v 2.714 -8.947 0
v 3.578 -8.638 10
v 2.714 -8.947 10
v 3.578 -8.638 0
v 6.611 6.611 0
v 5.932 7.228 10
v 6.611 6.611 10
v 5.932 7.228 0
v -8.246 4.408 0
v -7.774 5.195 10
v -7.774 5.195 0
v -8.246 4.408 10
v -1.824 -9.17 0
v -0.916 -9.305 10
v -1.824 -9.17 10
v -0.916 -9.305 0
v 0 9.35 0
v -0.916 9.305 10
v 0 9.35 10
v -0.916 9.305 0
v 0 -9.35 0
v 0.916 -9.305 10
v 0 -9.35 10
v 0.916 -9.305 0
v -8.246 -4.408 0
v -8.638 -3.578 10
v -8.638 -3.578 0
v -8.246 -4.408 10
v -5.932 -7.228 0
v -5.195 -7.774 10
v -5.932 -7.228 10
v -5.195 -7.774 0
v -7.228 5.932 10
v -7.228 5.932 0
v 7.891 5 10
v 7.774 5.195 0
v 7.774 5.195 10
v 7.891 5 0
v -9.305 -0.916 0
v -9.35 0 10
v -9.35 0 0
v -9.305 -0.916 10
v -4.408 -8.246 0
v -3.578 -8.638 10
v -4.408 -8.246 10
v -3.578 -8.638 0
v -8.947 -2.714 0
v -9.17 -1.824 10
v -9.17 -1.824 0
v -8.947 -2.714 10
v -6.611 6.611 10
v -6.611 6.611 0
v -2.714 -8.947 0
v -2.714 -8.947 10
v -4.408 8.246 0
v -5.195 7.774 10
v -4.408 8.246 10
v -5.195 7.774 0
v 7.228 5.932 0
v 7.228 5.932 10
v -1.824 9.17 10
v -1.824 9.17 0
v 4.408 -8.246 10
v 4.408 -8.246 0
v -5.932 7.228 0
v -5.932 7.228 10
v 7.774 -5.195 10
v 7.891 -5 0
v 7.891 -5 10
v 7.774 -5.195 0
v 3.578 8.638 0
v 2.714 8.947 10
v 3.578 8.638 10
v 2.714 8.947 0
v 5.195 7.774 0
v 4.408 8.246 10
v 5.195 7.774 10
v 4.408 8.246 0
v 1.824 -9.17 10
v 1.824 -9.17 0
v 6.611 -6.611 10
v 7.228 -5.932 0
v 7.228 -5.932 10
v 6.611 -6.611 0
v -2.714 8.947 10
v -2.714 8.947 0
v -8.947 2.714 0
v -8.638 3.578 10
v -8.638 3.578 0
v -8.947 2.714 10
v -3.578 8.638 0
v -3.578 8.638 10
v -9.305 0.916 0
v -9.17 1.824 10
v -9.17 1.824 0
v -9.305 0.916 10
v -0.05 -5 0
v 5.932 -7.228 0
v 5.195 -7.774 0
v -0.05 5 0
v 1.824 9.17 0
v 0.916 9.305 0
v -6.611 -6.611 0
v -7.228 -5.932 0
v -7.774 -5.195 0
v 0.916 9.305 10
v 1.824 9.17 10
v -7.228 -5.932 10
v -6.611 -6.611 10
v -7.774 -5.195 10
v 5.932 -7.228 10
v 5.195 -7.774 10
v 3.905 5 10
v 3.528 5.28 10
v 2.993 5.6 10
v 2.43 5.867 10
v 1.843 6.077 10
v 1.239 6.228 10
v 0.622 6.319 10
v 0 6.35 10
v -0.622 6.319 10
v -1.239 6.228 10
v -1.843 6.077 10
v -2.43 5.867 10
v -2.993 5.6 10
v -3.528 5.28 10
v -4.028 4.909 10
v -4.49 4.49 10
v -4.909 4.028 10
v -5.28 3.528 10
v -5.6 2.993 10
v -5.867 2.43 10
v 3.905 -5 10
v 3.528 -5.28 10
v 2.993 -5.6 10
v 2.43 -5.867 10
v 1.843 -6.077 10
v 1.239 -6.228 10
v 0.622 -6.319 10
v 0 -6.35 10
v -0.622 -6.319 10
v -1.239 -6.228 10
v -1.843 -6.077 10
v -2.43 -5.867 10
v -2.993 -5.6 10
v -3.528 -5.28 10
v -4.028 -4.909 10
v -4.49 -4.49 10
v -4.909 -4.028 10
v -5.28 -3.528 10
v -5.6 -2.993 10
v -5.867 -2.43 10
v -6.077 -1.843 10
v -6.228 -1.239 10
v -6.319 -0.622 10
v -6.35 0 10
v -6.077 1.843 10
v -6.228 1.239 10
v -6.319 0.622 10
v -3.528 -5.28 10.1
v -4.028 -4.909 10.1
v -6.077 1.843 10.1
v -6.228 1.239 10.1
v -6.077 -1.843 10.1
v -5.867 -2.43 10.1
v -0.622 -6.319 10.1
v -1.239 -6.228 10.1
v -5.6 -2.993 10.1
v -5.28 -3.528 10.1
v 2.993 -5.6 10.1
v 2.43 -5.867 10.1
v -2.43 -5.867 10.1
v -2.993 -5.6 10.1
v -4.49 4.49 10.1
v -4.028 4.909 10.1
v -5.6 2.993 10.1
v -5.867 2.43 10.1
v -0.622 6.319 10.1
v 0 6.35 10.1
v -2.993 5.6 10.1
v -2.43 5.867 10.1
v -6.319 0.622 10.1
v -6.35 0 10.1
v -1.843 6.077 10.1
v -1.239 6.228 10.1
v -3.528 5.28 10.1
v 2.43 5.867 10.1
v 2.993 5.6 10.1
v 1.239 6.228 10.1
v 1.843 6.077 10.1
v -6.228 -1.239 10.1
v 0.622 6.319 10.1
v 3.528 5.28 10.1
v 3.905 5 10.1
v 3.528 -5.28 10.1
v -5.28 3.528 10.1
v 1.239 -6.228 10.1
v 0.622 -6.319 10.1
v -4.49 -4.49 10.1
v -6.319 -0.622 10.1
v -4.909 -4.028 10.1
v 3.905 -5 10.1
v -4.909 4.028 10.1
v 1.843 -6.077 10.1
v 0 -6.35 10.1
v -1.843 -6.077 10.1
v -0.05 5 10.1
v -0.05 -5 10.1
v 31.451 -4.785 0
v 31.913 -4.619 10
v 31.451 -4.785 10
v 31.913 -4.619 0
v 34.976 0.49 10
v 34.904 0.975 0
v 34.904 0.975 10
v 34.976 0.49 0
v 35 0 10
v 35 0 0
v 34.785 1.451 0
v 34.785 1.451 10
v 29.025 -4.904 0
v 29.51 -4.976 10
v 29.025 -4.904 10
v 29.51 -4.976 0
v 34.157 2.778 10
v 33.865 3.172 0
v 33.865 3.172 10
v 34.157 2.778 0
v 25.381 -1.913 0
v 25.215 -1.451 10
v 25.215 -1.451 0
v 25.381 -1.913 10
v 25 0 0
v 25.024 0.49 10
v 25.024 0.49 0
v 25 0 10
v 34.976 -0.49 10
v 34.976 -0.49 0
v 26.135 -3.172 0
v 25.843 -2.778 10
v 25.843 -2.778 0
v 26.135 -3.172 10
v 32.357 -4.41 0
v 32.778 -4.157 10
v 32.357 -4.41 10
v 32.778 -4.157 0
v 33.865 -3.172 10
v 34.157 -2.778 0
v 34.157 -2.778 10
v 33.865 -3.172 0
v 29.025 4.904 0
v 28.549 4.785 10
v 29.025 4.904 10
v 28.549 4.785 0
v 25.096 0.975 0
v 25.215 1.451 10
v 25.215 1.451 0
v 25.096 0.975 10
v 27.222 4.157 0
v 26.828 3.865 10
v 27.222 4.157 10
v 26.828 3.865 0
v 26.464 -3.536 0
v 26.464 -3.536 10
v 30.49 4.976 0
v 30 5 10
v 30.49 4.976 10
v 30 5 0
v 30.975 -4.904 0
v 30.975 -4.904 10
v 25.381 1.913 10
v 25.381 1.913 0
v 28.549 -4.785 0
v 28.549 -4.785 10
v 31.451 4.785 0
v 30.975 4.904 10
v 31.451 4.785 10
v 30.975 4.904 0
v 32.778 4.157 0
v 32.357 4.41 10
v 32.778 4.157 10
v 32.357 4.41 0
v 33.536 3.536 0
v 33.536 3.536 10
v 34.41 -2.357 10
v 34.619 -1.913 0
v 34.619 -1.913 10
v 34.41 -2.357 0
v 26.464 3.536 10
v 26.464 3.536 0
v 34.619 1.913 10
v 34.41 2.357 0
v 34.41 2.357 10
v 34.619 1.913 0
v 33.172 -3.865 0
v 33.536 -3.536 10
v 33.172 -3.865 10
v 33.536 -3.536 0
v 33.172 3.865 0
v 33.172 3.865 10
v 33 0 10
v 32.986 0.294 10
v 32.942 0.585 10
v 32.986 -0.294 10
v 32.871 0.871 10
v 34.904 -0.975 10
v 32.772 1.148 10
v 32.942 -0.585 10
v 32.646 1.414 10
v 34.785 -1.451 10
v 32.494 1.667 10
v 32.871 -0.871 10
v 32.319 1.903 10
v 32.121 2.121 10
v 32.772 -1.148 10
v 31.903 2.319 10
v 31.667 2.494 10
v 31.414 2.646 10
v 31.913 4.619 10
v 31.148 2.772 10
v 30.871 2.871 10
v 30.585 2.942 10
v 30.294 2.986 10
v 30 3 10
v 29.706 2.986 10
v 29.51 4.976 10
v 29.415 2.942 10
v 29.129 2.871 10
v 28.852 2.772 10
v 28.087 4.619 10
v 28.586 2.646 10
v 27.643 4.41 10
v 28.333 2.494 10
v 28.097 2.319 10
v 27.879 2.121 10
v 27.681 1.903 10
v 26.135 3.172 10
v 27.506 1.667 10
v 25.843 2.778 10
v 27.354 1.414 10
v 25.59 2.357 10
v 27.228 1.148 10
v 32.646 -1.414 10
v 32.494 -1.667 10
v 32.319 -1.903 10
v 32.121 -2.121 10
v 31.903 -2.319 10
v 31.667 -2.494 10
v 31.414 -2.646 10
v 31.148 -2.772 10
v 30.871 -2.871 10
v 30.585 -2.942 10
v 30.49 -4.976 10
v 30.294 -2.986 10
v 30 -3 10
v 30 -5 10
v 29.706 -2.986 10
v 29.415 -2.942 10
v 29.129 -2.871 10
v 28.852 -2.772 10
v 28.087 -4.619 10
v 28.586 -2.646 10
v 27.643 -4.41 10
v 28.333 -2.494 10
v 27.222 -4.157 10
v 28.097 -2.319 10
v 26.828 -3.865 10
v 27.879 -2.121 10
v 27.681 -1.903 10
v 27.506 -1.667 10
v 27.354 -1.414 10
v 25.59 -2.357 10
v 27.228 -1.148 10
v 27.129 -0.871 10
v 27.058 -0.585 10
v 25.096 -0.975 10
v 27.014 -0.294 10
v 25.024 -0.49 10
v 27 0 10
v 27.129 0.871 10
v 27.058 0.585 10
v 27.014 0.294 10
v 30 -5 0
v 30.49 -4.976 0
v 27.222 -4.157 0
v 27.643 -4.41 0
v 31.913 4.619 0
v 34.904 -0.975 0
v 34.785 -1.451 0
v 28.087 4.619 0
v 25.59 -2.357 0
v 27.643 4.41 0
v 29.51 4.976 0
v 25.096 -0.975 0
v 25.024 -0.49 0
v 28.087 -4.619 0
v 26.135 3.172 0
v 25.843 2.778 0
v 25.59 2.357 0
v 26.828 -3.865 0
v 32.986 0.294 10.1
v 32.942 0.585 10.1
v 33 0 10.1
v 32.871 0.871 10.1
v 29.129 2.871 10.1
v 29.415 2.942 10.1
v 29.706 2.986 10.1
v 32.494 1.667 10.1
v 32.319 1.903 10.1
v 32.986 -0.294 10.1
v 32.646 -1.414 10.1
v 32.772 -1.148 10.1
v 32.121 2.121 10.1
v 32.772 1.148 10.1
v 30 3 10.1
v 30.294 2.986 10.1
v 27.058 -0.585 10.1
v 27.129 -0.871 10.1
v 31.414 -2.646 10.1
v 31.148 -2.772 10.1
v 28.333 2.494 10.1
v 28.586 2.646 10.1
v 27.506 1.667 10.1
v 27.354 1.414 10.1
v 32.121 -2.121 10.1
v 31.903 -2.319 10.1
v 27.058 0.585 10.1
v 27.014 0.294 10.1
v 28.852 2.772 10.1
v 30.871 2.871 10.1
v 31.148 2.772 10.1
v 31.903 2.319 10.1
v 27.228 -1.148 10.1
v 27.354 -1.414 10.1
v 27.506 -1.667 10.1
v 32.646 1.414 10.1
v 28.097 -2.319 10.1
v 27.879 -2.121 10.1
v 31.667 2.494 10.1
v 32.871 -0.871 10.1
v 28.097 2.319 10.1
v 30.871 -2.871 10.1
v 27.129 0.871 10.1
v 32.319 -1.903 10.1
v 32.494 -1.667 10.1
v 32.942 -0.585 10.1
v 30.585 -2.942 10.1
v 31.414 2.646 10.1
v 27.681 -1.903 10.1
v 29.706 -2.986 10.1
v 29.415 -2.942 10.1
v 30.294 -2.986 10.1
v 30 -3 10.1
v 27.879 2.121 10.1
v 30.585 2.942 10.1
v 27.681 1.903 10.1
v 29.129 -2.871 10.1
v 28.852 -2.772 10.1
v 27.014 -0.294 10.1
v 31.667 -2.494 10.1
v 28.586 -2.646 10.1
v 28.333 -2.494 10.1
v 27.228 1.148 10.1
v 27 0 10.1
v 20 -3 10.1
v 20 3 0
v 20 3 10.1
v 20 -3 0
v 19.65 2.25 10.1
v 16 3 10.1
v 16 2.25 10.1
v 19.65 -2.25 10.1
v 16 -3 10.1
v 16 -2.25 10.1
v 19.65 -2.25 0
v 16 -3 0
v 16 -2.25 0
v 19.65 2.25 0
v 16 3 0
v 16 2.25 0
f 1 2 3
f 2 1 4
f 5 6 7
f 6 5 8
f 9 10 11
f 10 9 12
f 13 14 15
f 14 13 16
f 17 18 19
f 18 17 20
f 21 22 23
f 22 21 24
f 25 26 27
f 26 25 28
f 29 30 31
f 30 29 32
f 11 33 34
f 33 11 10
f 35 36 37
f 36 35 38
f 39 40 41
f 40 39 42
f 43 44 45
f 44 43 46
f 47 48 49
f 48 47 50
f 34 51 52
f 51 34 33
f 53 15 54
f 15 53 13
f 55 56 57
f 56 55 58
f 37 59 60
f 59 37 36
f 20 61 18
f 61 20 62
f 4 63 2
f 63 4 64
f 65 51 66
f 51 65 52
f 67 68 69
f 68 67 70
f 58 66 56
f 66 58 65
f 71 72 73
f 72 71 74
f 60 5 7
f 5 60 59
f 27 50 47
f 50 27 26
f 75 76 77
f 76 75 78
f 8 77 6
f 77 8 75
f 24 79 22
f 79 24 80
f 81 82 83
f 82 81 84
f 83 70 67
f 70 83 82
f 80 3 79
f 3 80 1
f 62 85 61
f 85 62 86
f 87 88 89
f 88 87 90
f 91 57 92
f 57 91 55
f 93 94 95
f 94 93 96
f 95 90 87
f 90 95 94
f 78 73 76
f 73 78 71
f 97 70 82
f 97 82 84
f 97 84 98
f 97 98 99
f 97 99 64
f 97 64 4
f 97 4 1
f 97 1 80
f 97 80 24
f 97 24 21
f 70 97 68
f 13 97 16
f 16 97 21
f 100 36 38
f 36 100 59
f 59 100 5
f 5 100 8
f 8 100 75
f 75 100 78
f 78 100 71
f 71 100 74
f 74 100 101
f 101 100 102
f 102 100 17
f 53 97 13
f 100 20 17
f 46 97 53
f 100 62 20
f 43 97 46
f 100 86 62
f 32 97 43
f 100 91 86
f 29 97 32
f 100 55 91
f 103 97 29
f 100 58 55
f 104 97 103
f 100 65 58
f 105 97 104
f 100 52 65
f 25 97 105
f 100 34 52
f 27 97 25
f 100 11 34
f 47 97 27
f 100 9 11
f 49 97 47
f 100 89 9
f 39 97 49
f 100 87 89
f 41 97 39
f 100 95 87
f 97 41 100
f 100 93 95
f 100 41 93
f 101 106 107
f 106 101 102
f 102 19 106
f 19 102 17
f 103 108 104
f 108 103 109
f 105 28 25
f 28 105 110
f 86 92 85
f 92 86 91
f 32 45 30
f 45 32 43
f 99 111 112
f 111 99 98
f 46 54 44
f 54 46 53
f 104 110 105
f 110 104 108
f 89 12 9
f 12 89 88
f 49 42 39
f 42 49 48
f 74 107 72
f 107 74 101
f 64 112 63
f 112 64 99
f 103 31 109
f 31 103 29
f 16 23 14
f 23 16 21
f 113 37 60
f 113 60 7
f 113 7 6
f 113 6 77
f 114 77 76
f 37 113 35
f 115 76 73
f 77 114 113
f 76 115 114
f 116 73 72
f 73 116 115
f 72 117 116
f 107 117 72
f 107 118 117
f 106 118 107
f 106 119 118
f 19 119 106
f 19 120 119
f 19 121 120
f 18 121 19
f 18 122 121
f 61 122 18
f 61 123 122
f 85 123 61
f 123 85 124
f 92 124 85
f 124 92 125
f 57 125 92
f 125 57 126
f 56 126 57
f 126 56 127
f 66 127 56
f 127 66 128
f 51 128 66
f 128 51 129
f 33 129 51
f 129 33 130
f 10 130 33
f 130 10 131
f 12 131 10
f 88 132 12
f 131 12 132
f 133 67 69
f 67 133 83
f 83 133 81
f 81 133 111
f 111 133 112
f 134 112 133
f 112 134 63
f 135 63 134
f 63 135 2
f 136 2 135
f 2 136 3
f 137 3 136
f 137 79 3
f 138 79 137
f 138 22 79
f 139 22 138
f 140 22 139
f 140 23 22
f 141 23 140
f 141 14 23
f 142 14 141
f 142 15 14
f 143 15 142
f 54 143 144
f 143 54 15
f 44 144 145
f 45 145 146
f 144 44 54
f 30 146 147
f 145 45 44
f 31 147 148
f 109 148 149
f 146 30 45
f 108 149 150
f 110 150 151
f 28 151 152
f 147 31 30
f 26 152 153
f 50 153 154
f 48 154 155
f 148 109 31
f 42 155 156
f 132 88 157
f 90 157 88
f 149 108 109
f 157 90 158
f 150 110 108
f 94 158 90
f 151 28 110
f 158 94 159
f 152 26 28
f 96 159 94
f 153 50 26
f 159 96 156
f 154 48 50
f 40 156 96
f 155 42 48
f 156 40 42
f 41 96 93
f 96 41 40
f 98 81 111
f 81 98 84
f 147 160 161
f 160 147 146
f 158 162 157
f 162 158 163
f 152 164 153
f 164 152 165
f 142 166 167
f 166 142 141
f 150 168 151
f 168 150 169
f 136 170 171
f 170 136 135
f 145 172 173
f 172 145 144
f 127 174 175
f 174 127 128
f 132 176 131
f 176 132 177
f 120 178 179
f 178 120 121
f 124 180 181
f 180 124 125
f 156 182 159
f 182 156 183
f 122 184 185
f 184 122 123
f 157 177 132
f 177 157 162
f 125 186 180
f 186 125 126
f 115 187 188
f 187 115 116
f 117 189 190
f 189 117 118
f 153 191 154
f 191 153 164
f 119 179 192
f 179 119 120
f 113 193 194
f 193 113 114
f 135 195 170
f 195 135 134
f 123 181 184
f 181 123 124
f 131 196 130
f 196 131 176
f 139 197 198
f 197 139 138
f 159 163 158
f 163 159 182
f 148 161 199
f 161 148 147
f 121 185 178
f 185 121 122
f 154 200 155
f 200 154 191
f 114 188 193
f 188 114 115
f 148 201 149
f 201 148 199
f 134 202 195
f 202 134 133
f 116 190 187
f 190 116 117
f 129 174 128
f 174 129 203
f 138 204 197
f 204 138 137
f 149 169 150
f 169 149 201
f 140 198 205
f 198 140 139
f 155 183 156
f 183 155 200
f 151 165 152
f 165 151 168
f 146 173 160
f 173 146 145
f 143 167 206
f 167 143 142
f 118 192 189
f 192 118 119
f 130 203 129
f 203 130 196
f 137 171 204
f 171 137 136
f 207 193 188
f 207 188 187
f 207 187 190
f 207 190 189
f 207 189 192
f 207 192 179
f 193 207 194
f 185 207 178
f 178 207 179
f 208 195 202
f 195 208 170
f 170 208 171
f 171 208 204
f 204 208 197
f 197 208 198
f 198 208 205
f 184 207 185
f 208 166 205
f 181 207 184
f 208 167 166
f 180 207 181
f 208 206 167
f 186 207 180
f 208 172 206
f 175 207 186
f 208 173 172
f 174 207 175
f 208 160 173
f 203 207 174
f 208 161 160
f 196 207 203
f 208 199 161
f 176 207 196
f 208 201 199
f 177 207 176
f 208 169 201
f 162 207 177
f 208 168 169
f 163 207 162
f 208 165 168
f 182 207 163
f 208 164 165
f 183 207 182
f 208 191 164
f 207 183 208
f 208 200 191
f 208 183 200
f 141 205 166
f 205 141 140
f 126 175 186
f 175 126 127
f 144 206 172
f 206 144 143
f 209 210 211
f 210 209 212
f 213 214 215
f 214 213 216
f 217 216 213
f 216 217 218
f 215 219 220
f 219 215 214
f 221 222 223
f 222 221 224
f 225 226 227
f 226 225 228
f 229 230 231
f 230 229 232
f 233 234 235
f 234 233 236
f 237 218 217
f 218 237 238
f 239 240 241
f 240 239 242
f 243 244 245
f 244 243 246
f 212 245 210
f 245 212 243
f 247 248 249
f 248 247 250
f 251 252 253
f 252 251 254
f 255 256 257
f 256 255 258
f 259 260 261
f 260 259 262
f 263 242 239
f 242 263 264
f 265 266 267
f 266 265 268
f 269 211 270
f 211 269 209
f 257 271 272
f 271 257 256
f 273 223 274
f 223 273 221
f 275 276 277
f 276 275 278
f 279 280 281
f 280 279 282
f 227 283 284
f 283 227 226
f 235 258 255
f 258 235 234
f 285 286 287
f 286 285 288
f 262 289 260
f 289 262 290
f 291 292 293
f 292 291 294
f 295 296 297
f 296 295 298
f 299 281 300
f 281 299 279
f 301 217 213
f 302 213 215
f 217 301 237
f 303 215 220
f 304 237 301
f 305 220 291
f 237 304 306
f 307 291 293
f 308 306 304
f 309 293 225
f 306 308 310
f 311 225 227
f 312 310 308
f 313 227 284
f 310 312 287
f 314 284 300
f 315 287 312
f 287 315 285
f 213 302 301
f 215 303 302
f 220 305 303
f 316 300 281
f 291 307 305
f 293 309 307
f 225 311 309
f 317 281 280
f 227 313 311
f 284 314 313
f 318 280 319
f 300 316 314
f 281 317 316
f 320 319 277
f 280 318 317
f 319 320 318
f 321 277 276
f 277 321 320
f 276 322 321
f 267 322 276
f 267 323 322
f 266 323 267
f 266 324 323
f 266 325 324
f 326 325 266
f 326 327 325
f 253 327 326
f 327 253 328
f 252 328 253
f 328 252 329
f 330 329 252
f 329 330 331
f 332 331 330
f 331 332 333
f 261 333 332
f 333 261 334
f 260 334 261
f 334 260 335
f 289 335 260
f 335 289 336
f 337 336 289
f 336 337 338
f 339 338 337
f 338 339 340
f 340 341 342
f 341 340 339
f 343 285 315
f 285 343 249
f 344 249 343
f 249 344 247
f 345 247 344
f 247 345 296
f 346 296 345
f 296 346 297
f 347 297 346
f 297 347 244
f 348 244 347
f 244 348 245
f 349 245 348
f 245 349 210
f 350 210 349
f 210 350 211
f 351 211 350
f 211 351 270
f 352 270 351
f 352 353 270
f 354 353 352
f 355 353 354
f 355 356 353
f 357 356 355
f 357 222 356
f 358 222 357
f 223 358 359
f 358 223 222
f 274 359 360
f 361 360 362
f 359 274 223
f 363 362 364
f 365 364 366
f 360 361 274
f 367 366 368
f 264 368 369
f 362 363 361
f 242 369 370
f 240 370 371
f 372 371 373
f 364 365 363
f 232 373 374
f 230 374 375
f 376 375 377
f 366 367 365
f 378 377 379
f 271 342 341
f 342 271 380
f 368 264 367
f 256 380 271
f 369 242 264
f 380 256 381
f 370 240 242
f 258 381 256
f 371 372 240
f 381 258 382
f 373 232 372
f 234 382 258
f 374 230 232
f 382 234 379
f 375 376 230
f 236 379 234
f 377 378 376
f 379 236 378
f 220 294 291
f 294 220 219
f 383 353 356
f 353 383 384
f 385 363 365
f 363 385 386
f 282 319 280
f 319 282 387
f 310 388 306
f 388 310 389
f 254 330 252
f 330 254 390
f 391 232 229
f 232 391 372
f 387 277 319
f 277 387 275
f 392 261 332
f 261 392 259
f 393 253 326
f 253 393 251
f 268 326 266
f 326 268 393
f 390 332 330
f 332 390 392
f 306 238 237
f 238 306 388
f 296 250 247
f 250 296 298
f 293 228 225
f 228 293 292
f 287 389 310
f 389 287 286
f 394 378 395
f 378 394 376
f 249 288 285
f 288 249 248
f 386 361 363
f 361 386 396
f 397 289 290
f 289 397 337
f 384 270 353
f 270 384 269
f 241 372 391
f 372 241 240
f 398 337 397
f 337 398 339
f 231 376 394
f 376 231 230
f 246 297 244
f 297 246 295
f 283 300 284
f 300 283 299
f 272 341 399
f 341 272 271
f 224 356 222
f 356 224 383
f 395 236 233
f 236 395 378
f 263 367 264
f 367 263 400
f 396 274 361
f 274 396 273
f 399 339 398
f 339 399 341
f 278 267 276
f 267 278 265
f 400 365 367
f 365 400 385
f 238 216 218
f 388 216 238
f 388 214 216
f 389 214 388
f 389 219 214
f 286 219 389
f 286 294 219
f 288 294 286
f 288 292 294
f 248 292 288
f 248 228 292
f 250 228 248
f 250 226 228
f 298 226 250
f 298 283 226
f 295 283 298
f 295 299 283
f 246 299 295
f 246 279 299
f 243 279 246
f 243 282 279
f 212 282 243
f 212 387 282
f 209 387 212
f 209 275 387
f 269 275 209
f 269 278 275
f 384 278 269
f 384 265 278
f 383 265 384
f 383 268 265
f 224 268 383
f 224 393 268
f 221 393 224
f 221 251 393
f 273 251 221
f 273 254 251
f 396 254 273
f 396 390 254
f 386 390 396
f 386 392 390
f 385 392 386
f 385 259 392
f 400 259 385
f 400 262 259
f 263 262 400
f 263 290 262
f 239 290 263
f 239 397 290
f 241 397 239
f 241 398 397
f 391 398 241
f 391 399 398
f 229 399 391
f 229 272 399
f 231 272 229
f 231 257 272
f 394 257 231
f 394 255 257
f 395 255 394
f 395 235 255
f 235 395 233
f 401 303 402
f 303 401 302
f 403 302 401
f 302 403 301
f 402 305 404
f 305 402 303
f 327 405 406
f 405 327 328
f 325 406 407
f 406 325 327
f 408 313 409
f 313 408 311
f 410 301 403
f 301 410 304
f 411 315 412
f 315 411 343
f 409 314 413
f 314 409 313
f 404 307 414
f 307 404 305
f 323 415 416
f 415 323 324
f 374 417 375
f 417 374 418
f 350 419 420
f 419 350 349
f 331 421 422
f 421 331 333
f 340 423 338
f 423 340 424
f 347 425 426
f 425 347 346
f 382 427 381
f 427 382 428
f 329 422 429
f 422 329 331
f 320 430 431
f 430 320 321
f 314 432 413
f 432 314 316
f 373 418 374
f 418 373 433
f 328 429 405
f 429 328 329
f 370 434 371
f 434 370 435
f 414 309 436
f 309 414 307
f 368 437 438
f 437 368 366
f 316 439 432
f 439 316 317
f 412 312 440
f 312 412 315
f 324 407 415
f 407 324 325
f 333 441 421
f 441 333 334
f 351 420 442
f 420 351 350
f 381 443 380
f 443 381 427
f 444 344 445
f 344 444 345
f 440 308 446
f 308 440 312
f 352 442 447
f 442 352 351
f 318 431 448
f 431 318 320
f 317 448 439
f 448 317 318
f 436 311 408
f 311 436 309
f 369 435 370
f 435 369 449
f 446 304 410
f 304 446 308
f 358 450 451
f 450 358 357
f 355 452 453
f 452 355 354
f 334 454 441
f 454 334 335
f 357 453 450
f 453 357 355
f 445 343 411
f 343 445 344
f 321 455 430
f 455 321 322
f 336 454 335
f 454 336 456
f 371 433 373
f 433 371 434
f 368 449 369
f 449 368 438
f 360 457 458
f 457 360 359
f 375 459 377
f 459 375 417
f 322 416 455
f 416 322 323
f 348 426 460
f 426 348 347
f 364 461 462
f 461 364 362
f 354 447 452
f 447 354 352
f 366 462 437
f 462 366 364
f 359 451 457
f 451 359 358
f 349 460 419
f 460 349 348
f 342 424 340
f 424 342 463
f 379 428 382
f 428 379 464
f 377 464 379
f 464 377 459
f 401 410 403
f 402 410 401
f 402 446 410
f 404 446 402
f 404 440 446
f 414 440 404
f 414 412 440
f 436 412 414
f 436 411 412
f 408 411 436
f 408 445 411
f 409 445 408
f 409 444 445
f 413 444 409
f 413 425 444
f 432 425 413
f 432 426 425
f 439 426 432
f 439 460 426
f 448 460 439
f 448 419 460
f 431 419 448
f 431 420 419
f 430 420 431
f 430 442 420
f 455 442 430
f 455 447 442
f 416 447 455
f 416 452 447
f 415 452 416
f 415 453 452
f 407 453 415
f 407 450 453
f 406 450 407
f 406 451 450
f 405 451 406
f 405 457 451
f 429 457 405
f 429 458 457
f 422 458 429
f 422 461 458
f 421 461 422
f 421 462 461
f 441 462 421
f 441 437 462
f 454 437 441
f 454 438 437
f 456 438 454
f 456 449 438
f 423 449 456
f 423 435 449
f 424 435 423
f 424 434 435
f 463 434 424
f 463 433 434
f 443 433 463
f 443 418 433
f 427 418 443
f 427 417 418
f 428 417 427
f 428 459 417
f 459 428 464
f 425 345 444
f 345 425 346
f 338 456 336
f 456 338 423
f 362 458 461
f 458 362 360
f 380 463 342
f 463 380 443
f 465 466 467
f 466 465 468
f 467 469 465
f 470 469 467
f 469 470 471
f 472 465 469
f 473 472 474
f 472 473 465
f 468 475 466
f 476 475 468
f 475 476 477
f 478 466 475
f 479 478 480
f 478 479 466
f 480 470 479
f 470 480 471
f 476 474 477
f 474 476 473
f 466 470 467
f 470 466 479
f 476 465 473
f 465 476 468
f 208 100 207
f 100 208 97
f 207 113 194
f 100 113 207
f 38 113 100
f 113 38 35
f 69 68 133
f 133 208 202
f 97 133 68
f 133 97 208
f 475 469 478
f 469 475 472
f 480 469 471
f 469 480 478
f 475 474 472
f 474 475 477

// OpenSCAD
// Snap-on Clip for Lab Stand Rod and Tubing
// Orientation: Flat on XY plane, building up in +Z.
// Units: Millimetres.

// --- Dimensions ---
// Rod Ring
$rod_id = 12.7;      // Inner diameter (mm)
$rod_wall = 3.0;     // Wall thickness (mm)
$rod_od = $rod_id + 2 * $rod_wall; // Outer diameter (mm)
$rod_z = 10.0;       // Height of extrusion (mm)

// Tubing Ring
$tube_id = 6.0;      // Inner diameter (mm)
$tube_wall = 2.0;    // Wall thickness (mm)
$tube_od = $tube_id + 2 * $tube_wall; // Outer diameter (mm)
$tube_x_center = 15.0; // Center X position (mm)

// Bridge
$bridge_x_start = 8.0; // Start X (mm)
$bridge_x_end = 12.0;  // End X (mm)
$bridge_y_half = 3.0;  // Half width in Y (mm) -> Total 6mm

// Cutouts (Openings)
// Rod Ring Cutout: -X side relative to ring center, width 10mm
$rod_cut_width = 10.0;
$rod_cut_y_half = $rod_cut_width / 2;

// Tubing Ring Cutout: +X side relative to ring center, width 4.5mm
$tube_cut_width = 4.5;
$tube_cut_y_half = $tube_cut_width / 2;

// --- Geometry Construction ---

module rod_ring() {
    // Main ring body centered at (0,0)
    cylinder(h = $rod_z, d = $rod_od, $fn = 64);
    // Inner hole
    cylinder(h = $rod_z + 0.1, d = $rod_id, $fn = 64);
}

module tube_ring() {
    // Main ring body centered at (tube_x_center, 0)
    translate([$tube_x_center, 0, 0])
        cylinder(h = $rod_z, d = $tube_od, $fn = 64);
    // Inner hole
    translate([$tube_x_center, 0, 0])
        cylinder(h = $rod_z + 0.1, d = $tube_id, $fn = 64);
}

module bridge() {
    // Solid bridge connecting the two rings
    // Spans from x=8 to x=12, width 6mm in Y
    translate([$bridge_x_start, -$bridge_y_half, 0])
        cube([
            $bridge_x_end - $bridge_x_start, // Width in X
            $bridge_y_half * 2,              // Width in Y (6mm)
            $rod_z + 0.1                     // Height
        ]);
}

// --- Final Assembly ---

difference() {
    union() {
        // 1. Rod Ring (Centered at origin)
        translate([0, 0, 0])
            rod_ring();
        
        // 2. Tubing Ring (Centered at x=15)
        translate([$tube_x_center, 0, 0])
            tube_ring();
        
        // 3. Bridge
        translate([$bridge_x_start, 0, 0])
            bridge();
    }
    
    // --- Cutouts (Applied to the whole assembly) ---
    
    // Rod Ring Cutout: -X side relative to ring center (0,0)
    // Remove area where x < 0 (relative to ring) and -5 < y < 5
    translate([-0.05, -$rod_cut_y_half, 0])
        cube([
            $rod_cut_width + 0.1, // Width in X
            $rod_cut_width,       // Width in Y
            $rod_z + 0.1          // Height
        ]);
    
    // Tubing Ring Cutout: +X side relative to ring center (15,0)
    // Remove area where x > 0 (relative to ring) and -2.25 < y < 2.25
    translate([$tube_x_center + 0.05, -$tube_cut_y_half, 0])
        cube([
            $tube_cut_width + 0.1, // Width in X
            $tube_cut_width,       // Width in Y
            $rod_z + 0.1           // Height
        ]);
}
